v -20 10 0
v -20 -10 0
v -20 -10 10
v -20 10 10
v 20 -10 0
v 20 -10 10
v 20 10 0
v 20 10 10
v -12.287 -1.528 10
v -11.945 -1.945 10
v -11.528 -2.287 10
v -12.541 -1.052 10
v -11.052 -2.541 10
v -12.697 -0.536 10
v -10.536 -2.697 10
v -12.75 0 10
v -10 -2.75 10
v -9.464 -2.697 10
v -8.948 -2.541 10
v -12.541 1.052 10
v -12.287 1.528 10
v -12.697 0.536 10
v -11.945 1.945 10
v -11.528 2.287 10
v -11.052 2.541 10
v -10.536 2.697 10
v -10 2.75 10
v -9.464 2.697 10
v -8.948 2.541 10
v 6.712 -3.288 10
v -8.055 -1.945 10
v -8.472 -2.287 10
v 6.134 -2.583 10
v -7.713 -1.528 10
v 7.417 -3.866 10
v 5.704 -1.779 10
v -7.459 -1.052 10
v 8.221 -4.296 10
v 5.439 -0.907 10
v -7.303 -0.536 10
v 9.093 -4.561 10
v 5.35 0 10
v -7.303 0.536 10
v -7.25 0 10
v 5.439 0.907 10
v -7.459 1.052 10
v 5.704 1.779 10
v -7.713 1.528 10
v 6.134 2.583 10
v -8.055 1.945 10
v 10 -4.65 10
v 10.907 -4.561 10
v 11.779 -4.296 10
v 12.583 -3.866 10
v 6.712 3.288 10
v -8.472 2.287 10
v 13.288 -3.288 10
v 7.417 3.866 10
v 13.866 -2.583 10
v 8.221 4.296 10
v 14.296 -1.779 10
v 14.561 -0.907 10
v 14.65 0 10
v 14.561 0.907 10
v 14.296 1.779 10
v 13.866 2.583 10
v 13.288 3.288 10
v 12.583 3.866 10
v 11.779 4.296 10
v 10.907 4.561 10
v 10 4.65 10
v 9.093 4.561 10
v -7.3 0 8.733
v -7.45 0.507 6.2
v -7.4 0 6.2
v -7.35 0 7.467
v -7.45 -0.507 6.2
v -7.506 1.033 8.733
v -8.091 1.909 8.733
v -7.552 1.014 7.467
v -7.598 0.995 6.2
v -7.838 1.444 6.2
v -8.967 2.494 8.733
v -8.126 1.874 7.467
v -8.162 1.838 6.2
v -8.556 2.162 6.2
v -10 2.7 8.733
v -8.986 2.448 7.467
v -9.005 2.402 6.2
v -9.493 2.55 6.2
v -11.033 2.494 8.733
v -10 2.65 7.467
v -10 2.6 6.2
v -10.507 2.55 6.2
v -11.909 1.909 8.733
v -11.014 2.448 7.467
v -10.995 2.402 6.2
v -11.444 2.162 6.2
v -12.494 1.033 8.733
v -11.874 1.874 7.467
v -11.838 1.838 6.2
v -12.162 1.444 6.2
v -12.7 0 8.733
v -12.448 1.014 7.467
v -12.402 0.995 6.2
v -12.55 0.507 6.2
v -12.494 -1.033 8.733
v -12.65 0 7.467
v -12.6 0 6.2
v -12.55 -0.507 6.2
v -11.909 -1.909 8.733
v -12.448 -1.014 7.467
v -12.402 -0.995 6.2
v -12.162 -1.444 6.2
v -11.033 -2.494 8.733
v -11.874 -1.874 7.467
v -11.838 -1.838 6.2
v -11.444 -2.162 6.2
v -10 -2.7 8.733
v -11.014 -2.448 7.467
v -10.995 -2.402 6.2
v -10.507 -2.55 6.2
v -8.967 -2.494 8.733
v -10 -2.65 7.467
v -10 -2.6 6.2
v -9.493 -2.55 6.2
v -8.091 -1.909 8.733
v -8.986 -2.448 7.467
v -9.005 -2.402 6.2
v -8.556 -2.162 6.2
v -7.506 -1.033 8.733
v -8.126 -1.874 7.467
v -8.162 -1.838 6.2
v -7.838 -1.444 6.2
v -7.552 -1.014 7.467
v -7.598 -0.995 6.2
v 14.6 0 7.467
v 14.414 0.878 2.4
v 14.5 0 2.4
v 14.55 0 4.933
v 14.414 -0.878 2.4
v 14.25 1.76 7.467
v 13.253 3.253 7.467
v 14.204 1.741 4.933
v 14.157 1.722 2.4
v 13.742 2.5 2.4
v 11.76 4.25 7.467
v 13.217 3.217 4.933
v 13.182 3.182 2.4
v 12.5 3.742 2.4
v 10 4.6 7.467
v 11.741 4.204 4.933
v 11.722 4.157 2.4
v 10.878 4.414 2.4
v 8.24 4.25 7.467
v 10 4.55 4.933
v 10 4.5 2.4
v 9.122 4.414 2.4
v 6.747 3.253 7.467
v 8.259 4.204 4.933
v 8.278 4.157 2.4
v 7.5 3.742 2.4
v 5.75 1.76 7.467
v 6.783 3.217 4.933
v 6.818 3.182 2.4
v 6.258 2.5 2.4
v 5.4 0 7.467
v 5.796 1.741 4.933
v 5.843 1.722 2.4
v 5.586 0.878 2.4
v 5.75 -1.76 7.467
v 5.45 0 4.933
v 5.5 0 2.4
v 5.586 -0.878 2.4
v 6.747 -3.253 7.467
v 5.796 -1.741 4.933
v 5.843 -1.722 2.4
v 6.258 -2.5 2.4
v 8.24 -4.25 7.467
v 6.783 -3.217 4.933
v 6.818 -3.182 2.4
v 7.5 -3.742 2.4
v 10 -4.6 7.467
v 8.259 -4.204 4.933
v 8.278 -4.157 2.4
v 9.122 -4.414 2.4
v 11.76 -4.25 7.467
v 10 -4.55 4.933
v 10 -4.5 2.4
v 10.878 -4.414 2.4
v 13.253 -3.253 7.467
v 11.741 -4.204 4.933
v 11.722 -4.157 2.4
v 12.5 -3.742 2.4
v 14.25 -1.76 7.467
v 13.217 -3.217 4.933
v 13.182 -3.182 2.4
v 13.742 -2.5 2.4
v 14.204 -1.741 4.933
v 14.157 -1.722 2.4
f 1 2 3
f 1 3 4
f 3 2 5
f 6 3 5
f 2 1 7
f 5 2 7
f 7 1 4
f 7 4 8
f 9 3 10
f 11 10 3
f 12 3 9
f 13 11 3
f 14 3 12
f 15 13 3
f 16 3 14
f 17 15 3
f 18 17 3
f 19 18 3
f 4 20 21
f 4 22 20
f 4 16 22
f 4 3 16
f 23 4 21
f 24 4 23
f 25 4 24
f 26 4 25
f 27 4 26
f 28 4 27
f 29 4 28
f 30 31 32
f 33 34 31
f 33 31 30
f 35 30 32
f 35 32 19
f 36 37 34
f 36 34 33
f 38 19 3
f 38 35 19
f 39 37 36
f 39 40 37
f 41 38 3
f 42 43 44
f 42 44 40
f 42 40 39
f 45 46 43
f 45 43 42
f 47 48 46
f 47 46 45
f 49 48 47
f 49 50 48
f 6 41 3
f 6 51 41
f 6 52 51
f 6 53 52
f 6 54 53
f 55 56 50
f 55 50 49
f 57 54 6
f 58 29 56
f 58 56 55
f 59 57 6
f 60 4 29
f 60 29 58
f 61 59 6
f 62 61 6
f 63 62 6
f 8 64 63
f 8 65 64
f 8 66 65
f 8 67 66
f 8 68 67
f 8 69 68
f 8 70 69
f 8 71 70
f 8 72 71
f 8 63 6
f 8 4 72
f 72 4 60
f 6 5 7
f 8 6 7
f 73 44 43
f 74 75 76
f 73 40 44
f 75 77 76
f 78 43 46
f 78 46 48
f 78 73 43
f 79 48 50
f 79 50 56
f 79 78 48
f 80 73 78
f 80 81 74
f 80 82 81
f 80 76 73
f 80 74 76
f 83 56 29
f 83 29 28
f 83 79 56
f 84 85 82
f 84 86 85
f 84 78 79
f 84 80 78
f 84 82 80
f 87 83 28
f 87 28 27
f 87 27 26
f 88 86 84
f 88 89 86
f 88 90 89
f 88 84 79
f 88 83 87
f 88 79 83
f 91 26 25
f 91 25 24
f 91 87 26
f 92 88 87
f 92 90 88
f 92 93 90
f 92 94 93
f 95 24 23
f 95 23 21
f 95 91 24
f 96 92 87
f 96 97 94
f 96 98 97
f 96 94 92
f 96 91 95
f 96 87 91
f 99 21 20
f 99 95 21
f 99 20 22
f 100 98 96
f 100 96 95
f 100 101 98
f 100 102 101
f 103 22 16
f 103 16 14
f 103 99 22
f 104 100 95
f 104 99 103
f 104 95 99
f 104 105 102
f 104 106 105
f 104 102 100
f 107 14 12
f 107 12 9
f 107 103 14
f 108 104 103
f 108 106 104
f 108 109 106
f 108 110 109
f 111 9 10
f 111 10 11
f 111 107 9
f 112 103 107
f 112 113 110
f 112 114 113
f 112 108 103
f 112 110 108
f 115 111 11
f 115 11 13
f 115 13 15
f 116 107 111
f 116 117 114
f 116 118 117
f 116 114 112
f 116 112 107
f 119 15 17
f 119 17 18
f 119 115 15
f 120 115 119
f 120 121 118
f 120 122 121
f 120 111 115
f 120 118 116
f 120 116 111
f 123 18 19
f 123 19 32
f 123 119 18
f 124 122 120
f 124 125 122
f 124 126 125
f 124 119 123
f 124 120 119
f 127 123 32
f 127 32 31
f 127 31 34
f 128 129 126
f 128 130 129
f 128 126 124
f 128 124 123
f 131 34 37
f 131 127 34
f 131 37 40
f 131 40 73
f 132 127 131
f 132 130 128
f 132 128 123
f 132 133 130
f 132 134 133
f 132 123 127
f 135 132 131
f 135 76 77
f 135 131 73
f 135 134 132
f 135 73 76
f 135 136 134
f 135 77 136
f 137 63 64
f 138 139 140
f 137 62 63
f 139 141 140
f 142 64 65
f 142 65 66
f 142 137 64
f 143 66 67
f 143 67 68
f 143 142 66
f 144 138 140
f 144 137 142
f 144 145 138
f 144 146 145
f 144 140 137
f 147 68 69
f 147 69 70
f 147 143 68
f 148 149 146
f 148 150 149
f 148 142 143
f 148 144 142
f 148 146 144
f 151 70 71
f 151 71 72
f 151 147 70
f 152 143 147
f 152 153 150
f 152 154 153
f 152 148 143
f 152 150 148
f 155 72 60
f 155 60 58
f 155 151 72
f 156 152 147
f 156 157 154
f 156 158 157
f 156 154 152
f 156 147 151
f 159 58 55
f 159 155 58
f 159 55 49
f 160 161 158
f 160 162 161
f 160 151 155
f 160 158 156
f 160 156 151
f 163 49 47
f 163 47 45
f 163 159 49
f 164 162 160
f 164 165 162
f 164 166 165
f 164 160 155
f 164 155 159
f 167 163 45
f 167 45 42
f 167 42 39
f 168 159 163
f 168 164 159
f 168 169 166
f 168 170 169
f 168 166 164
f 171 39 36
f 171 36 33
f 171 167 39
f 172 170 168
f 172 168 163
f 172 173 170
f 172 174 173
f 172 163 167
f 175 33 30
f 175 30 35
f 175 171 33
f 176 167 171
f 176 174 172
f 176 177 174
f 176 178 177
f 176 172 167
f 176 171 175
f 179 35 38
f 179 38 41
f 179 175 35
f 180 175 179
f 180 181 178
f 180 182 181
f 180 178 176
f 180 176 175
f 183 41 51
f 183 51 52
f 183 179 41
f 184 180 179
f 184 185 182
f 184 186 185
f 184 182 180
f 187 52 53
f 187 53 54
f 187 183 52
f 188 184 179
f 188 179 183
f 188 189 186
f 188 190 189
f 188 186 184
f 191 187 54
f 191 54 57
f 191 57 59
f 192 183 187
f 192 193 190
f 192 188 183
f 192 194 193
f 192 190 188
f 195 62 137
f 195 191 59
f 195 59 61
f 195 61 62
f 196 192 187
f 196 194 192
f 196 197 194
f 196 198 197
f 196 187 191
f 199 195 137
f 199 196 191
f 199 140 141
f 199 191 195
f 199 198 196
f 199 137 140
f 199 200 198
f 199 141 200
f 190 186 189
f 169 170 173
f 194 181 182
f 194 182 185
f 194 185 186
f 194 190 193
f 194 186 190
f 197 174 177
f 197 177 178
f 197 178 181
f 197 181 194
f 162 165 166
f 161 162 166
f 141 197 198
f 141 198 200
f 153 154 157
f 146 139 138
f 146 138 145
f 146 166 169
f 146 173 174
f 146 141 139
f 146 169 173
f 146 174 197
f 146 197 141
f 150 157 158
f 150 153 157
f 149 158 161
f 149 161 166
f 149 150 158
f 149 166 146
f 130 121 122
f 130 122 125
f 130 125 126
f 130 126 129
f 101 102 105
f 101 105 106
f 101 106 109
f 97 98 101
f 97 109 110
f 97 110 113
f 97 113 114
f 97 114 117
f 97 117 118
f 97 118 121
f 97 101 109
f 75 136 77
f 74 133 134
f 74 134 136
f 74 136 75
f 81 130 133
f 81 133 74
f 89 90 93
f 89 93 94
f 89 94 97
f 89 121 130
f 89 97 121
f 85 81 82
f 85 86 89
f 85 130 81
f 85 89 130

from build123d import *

# Parameters (mm, degrees)
F0_W     = 40
F0_H     = 20
F1_DEPTH = 10
F2_R     = 2.75
F5_R     = 2.6
F7_R     = 4.65
F9_R     = 4.5


with BuildPart() as f1:
    # F0 (on Top) → F1 (new body)
    with BuildSketch(Plane.XY):
        Rectangle(F0_W, F0_H)
    extrude(amount=F1_DEPTH)

    # F2 (on face) → F6 section 0
    with BuildSketch(Plane.XY.offset(10)):
        with Locations((-10, 0)):
            Circle(F2_R)
    # F5 (on offset) → F6 section 1
    with BuildSketch(Plane.XY.offset(6.2)):
        with Locations((-10, 0)):
            Circle(F5_R)
    loft(mode=Mode.SUBTRACT)

    # F7 (on face) → F10 section 0
    with BuildSketch(Plane.XY.offset(10)):
        with Locations((10, 0)):
            Circle(F7_R)
    # F9 (on offset) → F10 section 1
    with BuildSketch(Plane.XY.offset(2.4)):
        with Locations((10, 0)):
            Circle(F9_R)
    loft(mode=Mode.SUBTRACT)


solid = f1.part
